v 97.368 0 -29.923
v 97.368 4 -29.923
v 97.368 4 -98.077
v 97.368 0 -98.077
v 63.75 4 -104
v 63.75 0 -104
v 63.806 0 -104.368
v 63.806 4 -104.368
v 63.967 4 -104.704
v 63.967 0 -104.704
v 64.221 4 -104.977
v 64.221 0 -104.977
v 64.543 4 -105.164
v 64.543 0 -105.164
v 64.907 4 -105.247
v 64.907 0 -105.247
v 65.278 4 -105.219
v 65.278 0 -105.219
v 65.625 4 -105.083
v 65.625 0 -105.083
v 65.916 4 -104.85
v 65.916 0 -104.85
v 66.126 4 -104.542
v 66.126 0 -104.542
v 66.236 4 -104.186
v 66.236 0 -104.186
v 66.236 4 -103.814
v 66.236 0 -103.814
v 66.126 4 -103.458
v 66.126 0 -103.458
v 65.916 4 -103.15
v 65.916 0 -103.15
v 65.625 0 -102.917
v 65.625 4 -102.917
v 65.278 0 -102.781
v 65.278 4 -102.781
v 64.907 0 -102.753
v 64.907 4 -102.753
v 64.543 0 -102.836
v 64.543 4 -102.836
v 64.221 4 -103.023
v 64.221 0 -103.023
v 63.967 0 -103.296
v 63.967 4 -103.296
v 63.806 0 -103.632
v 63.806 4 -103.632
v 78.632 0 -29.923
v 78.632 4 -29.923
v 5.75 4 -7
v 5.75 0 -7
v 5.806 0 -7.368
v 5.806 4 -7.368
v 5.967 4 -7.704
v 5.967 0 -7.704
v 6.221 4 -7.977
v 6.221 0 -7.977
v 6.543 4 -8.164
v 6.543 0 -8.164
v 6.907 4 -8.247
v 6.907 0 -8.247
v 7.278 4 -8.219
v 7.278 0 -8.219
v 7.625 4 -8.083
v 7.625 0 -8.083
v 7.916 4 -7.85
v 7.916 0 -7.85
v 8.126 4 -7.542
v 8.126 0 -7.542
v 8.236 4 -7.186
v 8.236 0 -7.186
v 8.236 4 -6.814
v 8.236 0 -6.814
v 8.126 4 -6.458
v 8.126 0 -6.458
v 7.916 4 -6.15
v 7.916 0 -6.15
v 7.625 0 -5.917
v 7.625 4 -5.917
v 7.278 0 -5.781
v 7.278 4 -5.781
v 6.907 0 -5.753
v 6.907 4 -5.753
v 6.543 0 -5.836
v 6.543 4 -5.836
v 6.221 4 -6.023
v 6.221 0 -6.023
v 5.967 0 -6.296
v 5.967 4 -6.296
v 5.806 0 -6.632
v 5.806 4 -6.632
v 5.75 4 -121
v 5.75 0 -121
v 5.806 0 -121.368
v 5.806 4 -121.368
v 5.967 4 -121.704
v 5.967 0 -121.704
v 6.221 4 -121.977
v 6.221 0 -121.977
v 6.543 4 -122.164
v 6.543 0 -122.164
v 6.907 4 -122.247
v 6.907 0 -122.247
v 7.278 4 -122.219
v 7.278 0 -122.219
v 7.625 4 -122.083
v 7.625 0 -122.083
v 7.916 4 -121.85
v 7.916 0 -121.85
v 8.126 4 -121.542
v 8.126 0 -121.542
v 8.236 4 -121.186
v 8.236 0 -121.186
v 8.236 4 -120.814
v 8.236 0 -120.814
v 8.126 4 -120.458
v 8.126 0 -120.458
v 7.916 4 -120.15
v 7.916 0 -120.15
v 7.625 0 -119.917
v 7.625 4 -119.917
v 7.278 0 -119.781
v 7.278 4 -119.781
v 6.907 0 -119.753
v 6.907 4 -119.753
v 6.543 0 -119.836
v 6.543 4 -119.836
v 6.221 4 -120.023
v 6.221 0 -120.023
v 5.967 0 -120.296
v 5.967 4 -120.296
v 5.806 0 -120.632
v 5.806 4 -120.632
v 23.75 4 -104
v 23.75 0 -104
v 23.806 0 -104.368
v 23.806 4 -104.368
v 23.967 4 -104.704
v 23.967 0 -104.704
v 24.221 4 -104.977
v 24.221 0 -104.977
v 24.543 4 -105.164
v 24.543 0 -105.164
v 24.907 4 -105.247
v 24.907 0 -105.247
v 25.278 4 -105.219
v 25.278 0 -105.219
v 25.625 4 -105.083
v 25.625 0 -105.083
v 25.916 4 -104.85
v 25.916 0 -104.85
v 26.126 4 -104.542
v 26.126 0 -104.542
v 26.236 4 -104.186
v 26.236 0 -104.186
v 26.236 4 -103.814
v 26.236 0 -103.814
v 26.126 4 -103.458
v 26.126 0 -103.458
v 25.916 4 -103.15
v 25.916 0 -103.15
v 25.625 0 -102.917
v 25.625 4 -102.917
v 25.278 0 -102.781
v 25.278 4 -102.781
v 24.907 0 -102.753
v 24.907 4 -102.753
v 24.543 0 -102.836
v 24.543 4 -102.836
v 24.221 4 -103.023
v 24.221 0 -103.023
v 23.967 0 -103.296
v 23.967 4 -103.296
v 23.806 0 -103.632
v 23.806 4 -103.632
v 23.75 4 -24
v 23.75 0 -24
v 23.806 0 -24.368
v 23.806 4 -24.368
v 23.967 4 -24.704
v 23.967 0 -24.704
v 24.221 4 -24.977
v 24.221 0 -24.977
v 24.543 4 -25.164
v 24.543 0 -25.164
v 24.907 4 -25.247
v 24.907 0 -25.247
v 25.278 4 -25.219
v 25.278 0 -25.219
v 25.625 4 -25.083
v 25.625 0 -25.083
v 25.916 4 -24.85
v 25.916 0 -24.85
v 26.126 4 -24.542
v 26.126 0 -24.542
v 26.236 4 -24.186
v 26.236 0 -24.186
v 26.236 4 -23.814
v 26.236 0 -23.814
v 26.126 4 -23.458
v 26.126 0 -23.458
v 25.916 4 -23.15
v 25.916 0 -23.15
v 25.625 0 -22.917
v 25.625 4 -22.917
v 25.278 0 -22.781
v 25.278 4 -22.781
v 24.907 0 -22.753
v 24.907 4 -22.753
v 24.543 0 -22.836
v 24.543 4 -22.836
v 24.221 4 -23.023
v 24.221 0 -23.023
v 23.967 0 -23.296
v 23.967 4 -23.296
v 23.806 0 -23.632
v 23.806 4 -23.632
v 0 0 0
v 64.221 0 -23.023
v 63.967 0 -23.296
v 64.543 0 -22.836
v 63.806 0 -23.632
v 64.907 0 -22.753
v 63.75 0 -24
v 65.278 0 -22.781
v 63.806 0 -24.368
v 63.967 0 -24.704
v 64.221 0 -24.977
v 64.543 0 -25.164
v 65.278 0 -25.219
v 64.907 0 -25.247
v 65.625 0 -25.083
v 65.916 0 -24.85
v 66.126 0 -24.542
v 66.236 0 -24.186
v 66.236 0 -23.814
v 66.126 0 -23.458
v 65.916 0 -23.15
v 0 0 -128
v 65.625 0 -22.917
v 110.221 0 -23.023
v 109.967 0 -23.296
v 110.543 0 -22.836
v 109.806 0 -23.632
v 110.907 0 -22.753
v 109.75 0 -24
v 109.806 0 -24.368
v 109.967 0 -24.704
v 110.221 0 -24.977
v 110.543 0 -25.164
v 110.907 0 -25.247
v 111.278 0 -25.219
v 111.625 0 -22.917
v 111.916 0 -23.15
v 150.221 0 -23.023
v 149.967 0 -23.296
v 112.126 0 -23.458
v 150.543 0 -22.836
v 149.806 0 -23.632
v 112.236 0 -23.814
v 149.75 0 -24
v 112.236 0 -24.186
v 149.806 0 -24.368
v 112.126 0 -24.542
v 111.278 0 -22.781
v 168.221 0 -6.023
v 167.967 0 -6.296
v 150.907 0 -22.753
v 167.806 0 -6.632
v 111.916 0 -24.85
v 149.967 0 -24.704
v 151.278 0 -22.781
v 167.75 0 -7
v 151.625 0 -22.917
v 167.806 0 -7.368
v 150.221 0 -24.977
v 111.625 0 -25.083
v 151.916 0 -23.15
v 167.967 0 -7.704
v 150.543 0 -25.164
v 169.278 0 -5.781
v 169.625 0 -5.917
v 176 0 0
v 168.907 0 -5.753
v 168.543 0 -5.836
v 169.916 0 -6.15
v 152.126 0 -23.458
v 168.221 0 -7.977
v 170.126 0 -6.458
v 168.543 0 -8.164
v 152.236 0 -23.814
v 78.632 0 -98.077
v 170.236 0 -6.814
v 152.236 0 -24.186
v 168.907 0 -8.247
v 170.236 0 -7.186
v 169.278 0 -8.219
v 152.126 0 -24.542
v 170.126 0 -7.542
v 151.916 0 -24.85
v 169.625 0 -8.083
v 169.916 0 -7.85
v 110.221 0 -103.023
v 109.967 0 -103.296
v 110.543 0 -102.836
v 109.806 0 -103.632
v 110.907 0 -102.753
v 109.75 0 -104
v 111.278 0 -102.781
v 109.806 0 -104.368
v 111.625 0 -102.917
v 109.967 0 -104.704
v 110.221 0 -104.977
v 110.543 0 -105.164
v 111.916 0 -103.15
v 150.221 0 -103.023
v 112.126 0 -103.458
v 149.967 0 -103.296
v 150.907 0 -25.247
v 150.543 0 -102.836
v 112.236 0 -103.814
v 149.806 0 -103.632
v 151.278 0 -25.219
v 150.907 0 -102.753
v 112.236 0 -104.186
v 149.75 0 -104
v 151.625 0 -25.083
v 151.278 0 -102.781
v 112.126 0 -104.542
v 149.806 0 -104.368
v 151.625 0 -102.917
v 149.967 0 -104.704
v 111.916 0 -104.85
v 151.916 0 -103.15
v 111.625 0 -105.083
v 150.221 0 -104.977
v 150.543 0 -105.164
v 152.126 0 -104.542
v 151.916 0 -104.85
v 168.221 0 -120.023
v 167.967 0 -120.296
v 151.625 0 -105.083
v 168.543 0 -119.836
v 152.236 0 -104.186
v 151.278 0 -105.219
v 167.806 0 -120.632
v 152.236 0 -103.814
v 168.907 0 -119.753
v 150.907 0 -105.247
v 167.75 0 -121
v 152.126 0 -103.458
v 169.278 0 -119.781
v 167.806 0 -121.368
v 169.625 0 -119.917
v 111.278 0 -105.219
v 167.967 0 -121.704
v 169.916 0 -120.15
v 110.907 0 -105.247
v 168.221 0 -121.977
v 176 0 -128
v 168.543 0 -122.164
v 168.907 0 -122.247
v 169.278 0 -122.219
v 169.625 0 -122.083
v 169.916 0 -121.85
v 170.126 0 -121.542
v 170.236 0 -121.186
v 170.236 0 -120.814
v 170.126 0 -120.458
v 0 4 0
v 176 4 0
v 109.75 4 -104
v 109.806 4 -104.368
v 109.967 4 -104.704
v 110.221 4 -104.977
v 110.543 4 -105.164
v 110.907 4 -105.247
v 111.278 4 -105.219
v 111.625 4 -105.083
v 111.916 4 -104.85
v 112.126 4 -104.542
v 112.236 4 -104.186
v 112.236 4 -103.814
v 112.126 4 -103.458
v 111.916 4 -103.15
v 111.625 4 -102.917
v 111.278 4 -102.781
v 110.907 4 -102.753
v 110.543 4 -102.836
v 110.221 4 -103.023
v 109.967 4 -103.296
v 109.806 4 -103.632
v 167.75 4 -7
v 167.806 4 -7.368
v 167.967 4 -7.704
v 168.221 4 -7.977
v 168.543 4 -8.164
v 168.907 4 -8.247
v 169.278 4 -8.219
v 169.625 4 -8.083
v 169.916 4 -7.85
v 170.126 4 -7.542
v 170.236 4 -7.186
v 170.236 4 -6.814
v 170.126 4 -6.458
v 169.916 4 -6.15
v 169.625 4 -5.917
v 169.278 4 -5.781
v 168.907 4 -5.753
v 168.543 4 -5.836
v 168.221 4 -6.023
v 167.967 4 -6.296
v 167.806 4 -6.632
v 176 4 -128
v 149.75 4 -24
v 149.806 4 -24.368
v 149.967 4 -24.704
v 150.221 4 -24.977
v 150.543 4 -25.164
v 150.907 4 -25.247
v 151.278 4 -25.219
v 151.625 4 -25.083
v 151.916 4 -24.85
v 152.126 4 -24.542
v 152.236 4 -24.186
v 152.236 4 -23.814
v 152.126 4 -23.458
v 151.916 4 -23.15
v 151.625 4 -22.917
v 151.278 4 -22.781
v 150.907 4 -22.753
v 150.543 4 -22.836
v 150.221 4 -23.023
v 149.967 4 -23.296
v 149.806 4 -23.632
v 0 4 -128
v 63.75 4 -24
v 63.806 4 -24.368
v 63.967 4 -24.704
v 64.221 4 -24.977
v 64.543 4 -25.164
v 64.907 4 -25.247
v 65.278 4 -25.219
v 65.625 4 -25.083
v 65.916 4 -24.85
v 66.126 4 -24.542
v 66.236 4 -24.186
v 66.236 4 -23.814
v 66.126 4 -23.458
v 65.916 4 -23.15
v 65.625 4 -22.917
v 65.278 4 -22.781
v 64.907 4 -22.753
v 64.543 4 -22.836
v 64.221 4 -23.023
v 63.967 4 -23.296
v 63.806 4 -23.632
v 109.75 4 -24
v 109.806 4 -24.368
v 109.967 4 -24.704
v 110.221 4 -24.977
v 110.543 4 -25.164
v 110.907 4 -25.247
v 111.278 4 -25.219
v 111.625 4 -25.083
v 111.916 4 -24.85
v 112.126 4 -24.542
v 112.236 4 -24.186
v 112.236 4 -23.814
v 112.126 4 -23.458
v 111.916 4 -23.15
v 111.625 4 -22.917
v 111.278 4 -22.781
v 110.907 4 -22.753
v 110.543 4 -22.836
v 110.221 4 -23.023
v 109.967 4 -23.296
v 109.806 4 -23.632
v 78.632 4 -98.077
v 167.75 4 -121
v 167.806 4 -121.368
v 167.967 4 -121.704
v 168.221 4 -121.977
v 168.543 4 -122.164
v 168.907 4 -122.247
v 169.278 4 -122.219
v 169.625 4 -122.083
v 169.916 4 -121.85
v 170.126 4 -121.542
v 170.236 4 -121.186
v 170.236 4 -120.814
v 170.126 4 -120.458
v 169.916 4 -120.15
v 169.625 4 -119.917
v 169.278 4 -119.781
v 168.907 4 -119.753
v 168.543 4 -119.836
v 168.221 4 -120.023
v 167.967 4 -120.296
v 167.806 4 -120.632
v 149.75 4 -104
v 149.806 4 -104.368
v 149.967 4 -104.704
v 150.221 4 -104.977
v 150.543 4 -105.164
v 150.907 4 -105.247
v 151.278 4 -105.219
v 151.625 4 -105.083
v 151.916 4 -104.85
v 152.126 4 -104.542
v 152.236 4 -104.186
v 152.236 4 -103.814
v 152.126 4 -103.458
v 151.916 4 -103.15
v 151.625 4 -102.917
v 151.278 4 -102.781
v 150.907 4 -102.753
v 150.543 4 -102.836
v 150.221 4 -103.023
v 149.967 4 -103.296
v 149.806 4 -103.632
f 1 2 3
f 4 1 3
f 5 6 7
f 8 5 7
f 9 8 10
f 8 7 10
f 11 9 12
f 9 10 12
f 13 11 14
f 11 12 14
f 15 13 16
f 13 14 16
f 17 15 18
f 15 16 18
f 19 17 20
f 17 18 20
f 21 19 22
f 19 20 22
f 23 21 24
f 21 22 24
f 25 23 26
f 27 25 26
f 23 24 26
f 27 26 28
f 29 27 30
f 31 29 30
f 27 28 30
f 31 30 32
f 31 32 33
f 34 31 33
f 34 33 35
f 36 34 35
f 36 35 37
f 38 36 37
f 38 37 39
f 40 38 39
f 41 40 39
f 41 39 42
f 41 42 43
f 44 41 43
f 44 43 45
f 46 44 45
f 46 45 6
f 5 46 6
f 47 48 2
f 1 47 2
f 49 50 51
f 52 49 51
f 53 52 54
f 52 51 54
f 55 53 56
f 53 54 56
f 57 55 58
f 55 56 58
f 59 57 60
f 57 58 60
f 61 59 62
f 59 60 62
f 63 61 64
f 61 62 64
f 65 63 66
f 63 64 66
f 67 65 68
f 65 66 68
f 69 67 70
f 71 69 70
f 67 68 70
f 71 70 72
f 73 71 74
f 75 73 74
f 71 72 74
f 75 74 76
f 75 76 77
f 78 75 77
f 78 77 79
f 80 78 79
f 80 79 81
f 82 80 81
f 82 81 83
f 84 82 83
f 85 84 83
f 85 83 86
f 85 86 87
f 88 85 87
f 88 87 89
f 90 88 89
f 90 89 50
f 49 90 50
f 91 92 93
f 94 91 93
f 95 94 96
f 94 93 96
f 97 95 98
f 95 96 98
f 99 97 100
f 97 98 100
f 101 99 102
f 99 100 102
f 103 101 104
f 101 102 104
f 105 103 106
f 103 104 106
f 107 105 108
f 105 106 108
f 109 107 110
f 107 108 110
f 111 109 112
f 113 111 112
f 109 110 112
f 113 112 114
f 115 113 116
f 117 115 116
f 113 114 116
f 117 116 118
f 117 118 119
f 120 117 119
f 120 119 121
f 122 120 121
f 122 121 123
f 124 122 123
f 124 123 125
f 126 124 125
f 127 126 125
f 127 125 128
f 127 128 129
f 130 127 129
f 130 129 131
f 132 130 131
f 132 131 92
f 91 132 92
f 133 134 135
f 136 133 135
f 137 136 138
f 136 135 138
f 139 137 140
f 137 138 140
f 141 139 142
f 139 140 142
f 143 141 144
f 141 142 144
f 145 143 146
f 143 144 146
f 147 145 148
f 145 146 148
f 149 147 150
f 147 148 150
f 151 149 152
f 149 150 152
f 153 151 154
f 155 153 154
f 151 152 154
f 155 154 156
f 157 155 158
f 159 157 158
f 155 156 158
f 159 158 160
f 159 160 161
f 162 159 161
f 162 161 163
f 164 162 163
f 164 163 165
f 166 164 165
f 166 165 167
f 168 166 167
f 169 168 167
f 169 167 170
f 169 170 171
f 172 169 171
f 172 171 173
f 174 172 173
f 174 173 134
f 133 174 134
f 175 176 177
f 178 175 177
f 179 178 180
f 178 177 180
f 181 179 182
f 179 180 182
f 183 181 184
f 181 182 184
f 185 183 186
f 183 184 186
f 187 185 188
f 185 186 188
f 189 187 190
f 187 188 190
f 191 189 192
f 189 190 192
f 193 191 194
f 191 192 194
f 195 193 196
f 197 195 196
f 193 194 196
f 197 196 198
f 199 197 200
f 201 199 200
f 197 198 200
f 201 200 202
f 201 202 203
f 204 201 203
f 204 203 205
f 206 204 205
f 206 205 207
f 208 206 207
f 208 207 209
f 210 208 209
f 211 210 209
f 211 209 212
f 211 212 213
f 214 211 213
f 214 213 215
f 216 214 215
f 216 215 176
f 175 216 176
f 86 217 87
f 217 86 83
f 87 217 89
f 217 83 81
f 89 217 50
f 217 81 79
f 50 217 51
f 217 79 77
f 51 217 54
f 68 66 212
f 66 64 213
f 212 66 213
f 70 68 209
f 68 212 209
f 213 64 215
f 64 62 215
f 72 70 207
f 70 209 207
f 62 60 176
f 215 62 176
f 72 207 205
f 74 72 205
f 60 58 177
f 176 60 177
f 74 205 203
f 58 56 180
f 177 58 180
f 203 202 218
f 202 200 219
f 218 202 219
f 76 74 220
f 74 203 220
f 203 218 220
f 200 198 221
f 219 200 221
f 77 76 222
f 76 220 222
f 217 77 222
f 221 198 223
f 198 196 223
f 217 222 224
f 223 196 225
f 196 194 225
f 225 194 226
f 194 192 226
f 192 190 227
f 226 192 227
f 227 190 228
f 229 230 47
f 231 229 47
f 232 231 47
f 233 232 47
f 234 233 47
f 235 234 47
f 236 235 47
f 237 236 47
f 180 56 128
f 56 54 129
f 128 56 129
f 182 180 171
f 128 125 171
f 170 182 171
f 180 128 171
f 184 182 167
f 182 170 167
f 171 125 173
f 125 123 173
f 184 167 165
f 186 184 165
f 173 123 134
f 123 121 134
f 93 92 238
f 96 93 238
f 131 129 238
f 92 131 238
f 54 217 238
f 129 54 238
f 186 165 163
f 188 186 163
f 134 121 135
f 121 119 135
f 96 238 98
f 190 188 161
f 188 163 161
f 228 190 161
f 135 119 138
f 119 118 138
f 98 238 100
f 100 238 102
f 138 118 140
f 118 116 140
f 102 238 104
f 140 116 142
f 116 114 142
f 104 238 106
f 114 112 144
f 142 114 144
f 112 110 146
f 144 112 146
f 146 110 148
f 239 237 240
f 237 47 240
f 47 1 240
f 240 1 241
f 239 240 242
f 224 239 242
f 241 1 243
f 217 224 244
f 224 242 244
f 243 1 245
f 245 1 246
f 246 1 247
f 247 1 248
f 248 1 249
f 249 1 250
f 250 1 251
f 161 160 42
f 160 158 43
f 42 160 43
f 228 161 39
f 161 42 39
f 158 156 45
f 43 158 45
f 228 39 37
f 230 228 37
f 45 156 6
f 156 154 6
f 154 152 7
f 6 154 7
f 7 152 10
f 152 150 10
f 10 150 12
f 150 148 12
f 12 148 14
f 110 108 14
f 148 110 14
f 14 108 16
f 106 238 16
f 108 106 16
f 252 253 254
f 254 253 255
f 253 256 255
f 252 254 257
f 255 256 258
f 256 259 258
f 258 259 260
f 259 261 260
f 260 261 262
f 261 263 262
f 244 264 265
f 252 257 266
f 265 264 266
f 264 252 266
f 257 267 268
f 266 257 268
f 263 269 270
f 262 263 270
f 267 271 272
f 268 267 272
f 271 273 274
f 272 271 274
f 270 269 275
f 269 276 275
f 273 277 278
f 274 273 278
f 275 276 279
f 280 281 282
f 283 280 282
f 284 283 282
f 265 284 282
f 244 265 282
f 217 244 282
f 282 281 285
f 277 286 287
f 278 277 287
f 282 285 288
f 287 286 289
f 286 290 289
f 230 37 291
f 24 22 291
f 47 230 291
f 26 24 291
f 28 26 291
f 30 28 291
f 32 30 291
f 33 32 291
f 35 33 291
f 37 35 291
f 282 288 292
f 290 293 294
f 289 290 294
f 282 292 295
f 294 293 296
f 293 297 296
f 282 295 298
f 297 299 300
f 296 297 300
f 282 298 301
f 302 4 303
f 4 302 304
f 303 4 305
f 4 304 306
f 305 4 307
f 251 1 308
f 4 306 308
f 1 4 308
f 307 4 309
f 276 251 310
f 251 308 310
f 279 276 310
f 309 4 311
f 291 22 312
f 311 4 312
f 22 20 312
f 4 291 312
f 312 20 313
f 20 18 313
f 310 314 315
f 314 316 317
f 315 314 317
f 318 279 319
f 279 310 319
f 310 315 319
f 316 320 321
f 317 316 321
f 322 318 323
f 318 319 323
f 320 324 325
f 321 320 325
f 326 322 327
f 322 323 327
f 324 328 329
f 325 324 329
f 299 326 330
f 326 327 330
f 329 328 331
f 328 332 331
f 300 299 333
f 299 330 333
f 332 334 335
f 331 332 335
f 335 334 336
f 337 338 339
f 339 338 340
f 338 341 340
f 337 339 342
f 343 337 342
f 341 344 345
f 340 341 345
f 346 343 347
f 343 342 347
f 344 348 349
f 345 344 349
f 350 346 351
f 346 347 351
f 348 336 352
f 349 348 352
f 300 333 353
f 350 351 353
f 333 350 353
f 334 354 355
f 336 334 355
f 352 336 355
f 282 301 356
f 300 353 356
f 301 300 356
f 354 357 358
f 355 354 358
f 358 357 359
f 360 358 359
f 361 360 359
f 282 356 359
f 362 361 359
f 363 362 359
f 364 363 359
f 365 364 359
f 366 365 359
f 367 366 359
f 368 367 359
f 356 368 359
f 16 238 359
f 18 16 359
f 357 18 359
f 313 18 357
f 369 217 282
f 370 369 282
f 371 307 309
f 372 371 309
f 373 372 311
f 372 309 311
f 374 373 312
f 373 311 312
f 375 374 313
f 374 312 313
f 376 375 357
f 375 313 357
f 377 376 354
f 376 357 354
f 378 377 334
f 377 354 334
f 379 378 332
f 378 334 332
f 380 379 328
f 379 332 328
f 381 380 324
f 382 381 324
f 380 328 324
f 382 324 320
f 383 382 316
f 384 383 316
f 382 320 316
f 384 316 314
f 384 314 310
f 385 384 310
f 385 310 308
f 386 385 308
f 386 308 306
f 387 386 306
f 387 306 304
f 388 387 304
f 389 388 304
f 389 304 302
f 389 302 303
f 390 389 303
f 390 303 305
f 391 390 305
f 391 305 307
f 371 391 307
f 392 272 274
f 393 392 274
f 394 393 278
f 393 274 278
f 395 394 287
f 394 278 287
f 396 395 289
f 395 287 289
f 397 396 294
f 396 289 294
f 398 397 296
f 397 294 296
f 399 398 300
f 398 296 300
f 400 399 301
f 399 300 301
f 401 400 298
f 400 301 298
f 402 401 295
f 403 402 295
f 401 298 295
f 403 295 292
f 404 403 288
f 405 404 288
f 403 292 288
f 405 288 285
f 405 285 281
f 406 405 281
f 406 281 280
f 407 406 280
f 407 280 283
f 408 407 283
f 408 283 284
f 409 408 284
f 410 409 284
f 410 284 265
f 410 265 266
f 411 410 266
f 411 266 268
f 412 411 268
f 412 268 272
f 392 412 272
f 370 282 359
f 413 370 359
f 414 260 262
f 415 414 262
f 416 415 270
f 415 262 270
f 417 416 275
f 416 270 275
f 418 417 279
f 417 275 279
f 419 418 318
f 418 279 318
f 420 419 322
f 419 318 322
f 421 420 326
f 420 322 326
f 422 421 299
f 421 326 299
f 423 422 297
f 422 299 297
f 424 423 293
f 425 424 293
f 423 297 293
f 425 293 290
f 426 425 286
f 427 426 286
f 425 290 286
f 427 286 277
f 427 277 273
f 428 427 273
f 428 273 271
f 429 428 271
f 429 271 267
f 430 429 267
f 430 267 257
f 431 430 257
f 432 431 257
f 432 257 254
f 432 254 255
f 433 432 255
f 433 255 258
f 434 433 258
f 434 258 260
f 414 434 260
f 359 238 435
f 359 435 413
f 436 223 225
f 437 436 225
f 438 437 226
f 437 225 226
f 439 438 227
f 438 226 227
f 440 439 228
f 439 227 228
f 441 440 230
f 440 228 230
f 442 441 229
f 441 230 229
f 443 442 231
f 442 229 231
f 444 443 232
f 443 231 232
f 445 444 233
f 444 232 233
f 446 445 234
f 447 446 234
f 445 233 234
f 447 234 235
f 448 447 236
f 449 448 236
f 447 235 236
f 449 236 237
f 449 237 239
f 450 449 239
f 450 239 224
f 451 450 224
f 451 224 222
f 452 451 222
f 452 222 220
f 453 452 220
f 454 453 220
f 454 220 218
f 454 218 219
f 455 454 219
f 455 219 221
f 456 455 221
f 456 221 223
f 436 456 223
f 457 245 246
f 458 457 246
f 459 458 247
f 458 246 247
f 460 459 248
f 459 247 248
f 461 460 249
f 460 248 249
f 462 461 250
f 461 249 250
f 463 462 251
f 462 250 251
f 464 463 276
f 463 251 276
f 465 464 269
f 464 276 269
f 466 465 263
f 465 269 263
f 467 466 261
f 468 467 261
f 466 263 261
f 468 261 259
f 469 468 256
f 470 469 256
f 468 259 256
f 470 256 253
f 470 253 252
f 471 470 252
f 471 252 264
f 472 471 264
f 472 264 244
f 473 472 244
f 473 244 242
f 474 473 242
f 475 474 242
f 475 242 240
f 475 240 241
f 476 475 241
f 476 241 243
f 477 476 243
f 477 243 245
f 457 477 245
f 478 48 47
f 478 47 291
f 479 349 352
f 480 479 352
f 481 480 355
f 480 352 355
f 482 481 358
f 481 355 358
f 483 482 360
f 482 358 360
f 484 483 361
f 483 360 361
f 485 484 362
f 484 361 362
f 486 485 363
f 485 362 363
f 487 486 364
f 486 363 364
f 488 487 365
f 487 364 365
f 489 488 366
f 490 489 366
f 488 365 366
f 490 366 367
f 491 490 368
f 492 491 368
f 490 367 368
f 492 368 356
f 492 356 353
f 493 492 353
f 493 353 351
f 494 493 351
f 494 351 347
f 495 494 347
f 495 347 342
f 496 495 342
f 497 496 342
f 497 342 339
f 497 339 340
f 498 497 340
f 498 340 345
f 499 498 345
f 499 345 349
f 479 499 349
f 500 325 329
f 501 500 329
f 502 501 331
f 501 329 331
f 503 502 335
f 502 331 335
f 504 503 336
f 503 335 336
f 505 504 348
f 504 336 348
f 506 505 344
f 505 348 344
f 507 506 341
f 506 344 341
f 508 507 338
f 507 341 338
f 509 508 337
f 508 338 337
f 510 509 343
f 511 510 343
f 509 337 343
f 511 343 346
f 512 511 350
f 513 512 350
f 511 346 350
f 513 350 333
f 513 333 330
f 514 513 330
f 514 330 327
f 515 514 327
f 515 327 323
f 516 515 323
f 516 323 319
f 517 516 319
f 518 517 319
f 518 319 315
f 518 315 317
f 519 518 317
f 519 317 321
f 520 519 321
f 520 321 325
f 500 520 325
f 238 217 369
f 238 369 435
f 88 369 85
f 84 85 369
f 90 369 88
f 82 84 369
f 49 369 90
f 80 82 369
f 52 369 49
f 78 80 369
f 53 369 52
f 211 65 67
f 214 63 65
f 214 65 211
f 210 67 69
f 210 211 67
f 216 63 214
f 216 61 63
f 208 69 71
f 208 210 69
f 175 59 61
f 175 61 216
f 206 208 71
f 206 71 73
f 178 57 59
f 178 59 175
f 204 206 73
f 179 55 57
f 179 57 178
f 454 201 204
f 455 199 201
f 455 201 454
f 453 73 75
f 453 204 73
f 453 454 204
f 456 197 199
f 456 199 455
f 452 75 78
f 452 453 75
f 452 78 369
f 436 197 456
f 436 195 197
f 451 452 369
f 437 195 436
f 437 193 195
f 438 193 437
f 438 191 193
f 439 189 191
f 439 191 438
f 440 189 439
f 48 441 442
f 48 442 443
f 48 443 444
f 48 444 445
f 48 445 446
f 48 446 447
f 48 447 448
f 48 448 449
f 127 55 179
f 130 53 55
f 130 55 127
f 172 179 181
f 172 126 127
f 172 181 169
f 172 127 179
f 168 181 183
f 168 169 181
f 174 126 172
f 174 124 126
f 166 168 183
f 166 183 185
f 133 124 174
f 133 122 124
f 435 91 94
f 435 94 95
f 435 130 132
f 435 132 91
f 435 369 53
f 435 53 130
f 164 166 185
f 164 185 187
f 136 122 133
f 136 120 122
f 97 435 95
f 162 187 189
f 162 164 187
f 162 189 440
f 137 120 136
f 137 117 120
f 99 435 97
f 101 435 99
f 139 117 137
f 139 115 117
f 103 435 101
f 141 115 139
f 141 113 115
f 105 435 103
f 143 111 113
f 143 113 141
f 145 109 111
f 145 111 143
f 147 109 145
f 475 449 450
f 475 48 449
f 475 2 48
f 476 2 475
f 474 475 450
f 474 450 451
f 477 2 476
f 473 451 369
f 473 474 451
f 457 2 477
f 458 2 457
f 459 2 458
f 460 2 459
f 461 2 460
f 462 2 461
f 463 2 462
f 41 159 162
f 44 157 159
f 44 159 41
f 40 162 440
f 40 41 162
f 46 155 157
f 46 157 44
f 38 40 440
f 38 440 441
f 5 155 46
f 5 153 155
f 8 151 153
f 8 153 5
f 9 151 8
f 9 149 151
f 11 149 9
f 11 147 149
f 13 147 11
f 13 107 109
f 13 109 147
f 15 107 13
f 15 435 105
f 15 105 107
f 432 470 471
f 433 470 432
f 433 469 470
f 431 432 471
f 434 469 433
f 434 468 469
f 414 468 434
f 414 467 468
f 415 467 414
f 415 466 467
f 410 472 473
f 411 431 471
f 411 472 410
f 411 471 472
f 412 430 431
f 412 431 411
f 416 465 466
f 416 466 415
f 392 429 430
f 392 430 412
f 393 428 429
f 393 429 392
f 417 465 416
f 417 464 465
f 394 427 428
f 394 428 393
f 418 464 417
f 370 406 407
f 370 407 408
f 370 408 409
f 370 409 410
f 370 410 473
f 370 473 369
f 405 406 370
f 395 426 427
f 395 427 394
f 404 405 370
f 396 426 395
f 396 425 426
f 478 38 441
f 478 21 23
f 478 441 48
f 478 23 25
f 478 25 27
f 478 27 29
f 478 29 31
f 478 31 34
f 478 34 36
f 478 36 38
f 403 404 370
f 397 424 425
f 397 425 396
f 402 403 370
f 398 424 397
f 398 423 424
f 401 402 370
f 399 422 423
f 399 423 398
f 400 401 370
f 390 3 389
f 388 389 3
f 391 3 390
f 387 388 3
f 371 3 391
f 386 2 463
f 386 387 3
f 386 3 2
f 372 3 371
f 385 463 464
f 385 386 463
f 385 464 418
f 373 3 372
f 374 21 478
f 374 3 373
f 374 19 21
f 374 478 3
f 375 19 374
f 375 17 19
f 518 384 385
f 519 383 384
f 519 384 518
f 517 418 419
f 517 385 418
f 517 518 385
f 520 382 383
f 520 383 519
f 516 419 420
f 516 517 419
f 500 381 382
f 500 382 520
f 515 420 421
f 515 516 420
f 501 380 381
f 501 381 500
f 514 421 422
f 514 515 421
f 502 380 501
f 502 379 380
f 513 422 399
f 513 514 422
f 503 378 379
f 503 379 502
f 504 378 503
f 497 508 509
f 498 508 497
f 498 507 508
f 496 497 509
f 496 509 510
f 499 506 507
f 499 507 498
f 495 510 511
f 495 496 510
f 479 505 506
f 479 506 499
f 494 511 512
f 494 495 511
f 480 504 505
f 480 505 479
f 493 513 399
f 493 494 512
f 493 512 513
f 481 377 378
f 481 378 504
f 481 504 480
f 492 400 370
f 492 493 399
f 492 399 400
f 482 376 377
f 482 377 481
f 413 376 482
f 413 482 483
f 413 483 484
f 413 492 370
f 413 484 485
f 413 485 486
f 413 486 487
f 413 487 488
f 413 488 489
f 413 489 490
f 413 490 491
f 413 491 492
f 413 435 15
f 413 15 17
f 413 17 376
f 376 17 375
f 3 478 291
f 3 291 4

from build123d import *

# Parameters (mm, degrees)
SKETCH_1_W          = 176
SKETCH_1_H          = 128
EXTRUDE_1_DEPTH     = 4
SKETCH_3_W          = 18.73666899
SKETCH_3_H          = 68.153866922
CUT_EXTRUDE_2_DEPTH = 4
HOLE_WIZARD_M3_1_D  = 2.5


with BuildPart() as part:
    # 草图1 → 凸台-拉伸1 (new body)
    with BuildSketch(Plane(origin=(0, 0, 0), x_dir=(1, 0, 0), z_dir=(0, 1, 0))):
        with Locations((88, 64)):
            Rectangle(SKETCH_1_W, SKETCH_1_H)
    extrude(amount=EXTRUDE_1_DEPTH)

    # 草图3 → 切除-拉伸2 (cut)
    with BuildSketch(Plane(origin=(0, 4, 0), x_dir=(1, 0, 0), z_dir=(0, 1, 0))):
        with Locations((88, 64)):
            Rectangle(SKETCH_3_W, SKETCH_3_H)
    extrude(amount=-CUT_EXTRUDE_2_DEPTH, mode=Mode.SUBTRACT)

    # M3 螺纹孔1 (through all)
    with Locations(Plane(origin=(0, 4, 0), x_dir=(1, 0, 0), z_dir=(0, 1, 0))):
        with Locations((7, 121), (25, 104), (65, 104), (65, 24), (25, 24), (7, 7), (169, 7), (111, 24), (151, 24), (151, 104), (111, 104), (169, 121)):
            Hole(HOLE_WIZARD_M3_1_D / 2)


solid = part.part
